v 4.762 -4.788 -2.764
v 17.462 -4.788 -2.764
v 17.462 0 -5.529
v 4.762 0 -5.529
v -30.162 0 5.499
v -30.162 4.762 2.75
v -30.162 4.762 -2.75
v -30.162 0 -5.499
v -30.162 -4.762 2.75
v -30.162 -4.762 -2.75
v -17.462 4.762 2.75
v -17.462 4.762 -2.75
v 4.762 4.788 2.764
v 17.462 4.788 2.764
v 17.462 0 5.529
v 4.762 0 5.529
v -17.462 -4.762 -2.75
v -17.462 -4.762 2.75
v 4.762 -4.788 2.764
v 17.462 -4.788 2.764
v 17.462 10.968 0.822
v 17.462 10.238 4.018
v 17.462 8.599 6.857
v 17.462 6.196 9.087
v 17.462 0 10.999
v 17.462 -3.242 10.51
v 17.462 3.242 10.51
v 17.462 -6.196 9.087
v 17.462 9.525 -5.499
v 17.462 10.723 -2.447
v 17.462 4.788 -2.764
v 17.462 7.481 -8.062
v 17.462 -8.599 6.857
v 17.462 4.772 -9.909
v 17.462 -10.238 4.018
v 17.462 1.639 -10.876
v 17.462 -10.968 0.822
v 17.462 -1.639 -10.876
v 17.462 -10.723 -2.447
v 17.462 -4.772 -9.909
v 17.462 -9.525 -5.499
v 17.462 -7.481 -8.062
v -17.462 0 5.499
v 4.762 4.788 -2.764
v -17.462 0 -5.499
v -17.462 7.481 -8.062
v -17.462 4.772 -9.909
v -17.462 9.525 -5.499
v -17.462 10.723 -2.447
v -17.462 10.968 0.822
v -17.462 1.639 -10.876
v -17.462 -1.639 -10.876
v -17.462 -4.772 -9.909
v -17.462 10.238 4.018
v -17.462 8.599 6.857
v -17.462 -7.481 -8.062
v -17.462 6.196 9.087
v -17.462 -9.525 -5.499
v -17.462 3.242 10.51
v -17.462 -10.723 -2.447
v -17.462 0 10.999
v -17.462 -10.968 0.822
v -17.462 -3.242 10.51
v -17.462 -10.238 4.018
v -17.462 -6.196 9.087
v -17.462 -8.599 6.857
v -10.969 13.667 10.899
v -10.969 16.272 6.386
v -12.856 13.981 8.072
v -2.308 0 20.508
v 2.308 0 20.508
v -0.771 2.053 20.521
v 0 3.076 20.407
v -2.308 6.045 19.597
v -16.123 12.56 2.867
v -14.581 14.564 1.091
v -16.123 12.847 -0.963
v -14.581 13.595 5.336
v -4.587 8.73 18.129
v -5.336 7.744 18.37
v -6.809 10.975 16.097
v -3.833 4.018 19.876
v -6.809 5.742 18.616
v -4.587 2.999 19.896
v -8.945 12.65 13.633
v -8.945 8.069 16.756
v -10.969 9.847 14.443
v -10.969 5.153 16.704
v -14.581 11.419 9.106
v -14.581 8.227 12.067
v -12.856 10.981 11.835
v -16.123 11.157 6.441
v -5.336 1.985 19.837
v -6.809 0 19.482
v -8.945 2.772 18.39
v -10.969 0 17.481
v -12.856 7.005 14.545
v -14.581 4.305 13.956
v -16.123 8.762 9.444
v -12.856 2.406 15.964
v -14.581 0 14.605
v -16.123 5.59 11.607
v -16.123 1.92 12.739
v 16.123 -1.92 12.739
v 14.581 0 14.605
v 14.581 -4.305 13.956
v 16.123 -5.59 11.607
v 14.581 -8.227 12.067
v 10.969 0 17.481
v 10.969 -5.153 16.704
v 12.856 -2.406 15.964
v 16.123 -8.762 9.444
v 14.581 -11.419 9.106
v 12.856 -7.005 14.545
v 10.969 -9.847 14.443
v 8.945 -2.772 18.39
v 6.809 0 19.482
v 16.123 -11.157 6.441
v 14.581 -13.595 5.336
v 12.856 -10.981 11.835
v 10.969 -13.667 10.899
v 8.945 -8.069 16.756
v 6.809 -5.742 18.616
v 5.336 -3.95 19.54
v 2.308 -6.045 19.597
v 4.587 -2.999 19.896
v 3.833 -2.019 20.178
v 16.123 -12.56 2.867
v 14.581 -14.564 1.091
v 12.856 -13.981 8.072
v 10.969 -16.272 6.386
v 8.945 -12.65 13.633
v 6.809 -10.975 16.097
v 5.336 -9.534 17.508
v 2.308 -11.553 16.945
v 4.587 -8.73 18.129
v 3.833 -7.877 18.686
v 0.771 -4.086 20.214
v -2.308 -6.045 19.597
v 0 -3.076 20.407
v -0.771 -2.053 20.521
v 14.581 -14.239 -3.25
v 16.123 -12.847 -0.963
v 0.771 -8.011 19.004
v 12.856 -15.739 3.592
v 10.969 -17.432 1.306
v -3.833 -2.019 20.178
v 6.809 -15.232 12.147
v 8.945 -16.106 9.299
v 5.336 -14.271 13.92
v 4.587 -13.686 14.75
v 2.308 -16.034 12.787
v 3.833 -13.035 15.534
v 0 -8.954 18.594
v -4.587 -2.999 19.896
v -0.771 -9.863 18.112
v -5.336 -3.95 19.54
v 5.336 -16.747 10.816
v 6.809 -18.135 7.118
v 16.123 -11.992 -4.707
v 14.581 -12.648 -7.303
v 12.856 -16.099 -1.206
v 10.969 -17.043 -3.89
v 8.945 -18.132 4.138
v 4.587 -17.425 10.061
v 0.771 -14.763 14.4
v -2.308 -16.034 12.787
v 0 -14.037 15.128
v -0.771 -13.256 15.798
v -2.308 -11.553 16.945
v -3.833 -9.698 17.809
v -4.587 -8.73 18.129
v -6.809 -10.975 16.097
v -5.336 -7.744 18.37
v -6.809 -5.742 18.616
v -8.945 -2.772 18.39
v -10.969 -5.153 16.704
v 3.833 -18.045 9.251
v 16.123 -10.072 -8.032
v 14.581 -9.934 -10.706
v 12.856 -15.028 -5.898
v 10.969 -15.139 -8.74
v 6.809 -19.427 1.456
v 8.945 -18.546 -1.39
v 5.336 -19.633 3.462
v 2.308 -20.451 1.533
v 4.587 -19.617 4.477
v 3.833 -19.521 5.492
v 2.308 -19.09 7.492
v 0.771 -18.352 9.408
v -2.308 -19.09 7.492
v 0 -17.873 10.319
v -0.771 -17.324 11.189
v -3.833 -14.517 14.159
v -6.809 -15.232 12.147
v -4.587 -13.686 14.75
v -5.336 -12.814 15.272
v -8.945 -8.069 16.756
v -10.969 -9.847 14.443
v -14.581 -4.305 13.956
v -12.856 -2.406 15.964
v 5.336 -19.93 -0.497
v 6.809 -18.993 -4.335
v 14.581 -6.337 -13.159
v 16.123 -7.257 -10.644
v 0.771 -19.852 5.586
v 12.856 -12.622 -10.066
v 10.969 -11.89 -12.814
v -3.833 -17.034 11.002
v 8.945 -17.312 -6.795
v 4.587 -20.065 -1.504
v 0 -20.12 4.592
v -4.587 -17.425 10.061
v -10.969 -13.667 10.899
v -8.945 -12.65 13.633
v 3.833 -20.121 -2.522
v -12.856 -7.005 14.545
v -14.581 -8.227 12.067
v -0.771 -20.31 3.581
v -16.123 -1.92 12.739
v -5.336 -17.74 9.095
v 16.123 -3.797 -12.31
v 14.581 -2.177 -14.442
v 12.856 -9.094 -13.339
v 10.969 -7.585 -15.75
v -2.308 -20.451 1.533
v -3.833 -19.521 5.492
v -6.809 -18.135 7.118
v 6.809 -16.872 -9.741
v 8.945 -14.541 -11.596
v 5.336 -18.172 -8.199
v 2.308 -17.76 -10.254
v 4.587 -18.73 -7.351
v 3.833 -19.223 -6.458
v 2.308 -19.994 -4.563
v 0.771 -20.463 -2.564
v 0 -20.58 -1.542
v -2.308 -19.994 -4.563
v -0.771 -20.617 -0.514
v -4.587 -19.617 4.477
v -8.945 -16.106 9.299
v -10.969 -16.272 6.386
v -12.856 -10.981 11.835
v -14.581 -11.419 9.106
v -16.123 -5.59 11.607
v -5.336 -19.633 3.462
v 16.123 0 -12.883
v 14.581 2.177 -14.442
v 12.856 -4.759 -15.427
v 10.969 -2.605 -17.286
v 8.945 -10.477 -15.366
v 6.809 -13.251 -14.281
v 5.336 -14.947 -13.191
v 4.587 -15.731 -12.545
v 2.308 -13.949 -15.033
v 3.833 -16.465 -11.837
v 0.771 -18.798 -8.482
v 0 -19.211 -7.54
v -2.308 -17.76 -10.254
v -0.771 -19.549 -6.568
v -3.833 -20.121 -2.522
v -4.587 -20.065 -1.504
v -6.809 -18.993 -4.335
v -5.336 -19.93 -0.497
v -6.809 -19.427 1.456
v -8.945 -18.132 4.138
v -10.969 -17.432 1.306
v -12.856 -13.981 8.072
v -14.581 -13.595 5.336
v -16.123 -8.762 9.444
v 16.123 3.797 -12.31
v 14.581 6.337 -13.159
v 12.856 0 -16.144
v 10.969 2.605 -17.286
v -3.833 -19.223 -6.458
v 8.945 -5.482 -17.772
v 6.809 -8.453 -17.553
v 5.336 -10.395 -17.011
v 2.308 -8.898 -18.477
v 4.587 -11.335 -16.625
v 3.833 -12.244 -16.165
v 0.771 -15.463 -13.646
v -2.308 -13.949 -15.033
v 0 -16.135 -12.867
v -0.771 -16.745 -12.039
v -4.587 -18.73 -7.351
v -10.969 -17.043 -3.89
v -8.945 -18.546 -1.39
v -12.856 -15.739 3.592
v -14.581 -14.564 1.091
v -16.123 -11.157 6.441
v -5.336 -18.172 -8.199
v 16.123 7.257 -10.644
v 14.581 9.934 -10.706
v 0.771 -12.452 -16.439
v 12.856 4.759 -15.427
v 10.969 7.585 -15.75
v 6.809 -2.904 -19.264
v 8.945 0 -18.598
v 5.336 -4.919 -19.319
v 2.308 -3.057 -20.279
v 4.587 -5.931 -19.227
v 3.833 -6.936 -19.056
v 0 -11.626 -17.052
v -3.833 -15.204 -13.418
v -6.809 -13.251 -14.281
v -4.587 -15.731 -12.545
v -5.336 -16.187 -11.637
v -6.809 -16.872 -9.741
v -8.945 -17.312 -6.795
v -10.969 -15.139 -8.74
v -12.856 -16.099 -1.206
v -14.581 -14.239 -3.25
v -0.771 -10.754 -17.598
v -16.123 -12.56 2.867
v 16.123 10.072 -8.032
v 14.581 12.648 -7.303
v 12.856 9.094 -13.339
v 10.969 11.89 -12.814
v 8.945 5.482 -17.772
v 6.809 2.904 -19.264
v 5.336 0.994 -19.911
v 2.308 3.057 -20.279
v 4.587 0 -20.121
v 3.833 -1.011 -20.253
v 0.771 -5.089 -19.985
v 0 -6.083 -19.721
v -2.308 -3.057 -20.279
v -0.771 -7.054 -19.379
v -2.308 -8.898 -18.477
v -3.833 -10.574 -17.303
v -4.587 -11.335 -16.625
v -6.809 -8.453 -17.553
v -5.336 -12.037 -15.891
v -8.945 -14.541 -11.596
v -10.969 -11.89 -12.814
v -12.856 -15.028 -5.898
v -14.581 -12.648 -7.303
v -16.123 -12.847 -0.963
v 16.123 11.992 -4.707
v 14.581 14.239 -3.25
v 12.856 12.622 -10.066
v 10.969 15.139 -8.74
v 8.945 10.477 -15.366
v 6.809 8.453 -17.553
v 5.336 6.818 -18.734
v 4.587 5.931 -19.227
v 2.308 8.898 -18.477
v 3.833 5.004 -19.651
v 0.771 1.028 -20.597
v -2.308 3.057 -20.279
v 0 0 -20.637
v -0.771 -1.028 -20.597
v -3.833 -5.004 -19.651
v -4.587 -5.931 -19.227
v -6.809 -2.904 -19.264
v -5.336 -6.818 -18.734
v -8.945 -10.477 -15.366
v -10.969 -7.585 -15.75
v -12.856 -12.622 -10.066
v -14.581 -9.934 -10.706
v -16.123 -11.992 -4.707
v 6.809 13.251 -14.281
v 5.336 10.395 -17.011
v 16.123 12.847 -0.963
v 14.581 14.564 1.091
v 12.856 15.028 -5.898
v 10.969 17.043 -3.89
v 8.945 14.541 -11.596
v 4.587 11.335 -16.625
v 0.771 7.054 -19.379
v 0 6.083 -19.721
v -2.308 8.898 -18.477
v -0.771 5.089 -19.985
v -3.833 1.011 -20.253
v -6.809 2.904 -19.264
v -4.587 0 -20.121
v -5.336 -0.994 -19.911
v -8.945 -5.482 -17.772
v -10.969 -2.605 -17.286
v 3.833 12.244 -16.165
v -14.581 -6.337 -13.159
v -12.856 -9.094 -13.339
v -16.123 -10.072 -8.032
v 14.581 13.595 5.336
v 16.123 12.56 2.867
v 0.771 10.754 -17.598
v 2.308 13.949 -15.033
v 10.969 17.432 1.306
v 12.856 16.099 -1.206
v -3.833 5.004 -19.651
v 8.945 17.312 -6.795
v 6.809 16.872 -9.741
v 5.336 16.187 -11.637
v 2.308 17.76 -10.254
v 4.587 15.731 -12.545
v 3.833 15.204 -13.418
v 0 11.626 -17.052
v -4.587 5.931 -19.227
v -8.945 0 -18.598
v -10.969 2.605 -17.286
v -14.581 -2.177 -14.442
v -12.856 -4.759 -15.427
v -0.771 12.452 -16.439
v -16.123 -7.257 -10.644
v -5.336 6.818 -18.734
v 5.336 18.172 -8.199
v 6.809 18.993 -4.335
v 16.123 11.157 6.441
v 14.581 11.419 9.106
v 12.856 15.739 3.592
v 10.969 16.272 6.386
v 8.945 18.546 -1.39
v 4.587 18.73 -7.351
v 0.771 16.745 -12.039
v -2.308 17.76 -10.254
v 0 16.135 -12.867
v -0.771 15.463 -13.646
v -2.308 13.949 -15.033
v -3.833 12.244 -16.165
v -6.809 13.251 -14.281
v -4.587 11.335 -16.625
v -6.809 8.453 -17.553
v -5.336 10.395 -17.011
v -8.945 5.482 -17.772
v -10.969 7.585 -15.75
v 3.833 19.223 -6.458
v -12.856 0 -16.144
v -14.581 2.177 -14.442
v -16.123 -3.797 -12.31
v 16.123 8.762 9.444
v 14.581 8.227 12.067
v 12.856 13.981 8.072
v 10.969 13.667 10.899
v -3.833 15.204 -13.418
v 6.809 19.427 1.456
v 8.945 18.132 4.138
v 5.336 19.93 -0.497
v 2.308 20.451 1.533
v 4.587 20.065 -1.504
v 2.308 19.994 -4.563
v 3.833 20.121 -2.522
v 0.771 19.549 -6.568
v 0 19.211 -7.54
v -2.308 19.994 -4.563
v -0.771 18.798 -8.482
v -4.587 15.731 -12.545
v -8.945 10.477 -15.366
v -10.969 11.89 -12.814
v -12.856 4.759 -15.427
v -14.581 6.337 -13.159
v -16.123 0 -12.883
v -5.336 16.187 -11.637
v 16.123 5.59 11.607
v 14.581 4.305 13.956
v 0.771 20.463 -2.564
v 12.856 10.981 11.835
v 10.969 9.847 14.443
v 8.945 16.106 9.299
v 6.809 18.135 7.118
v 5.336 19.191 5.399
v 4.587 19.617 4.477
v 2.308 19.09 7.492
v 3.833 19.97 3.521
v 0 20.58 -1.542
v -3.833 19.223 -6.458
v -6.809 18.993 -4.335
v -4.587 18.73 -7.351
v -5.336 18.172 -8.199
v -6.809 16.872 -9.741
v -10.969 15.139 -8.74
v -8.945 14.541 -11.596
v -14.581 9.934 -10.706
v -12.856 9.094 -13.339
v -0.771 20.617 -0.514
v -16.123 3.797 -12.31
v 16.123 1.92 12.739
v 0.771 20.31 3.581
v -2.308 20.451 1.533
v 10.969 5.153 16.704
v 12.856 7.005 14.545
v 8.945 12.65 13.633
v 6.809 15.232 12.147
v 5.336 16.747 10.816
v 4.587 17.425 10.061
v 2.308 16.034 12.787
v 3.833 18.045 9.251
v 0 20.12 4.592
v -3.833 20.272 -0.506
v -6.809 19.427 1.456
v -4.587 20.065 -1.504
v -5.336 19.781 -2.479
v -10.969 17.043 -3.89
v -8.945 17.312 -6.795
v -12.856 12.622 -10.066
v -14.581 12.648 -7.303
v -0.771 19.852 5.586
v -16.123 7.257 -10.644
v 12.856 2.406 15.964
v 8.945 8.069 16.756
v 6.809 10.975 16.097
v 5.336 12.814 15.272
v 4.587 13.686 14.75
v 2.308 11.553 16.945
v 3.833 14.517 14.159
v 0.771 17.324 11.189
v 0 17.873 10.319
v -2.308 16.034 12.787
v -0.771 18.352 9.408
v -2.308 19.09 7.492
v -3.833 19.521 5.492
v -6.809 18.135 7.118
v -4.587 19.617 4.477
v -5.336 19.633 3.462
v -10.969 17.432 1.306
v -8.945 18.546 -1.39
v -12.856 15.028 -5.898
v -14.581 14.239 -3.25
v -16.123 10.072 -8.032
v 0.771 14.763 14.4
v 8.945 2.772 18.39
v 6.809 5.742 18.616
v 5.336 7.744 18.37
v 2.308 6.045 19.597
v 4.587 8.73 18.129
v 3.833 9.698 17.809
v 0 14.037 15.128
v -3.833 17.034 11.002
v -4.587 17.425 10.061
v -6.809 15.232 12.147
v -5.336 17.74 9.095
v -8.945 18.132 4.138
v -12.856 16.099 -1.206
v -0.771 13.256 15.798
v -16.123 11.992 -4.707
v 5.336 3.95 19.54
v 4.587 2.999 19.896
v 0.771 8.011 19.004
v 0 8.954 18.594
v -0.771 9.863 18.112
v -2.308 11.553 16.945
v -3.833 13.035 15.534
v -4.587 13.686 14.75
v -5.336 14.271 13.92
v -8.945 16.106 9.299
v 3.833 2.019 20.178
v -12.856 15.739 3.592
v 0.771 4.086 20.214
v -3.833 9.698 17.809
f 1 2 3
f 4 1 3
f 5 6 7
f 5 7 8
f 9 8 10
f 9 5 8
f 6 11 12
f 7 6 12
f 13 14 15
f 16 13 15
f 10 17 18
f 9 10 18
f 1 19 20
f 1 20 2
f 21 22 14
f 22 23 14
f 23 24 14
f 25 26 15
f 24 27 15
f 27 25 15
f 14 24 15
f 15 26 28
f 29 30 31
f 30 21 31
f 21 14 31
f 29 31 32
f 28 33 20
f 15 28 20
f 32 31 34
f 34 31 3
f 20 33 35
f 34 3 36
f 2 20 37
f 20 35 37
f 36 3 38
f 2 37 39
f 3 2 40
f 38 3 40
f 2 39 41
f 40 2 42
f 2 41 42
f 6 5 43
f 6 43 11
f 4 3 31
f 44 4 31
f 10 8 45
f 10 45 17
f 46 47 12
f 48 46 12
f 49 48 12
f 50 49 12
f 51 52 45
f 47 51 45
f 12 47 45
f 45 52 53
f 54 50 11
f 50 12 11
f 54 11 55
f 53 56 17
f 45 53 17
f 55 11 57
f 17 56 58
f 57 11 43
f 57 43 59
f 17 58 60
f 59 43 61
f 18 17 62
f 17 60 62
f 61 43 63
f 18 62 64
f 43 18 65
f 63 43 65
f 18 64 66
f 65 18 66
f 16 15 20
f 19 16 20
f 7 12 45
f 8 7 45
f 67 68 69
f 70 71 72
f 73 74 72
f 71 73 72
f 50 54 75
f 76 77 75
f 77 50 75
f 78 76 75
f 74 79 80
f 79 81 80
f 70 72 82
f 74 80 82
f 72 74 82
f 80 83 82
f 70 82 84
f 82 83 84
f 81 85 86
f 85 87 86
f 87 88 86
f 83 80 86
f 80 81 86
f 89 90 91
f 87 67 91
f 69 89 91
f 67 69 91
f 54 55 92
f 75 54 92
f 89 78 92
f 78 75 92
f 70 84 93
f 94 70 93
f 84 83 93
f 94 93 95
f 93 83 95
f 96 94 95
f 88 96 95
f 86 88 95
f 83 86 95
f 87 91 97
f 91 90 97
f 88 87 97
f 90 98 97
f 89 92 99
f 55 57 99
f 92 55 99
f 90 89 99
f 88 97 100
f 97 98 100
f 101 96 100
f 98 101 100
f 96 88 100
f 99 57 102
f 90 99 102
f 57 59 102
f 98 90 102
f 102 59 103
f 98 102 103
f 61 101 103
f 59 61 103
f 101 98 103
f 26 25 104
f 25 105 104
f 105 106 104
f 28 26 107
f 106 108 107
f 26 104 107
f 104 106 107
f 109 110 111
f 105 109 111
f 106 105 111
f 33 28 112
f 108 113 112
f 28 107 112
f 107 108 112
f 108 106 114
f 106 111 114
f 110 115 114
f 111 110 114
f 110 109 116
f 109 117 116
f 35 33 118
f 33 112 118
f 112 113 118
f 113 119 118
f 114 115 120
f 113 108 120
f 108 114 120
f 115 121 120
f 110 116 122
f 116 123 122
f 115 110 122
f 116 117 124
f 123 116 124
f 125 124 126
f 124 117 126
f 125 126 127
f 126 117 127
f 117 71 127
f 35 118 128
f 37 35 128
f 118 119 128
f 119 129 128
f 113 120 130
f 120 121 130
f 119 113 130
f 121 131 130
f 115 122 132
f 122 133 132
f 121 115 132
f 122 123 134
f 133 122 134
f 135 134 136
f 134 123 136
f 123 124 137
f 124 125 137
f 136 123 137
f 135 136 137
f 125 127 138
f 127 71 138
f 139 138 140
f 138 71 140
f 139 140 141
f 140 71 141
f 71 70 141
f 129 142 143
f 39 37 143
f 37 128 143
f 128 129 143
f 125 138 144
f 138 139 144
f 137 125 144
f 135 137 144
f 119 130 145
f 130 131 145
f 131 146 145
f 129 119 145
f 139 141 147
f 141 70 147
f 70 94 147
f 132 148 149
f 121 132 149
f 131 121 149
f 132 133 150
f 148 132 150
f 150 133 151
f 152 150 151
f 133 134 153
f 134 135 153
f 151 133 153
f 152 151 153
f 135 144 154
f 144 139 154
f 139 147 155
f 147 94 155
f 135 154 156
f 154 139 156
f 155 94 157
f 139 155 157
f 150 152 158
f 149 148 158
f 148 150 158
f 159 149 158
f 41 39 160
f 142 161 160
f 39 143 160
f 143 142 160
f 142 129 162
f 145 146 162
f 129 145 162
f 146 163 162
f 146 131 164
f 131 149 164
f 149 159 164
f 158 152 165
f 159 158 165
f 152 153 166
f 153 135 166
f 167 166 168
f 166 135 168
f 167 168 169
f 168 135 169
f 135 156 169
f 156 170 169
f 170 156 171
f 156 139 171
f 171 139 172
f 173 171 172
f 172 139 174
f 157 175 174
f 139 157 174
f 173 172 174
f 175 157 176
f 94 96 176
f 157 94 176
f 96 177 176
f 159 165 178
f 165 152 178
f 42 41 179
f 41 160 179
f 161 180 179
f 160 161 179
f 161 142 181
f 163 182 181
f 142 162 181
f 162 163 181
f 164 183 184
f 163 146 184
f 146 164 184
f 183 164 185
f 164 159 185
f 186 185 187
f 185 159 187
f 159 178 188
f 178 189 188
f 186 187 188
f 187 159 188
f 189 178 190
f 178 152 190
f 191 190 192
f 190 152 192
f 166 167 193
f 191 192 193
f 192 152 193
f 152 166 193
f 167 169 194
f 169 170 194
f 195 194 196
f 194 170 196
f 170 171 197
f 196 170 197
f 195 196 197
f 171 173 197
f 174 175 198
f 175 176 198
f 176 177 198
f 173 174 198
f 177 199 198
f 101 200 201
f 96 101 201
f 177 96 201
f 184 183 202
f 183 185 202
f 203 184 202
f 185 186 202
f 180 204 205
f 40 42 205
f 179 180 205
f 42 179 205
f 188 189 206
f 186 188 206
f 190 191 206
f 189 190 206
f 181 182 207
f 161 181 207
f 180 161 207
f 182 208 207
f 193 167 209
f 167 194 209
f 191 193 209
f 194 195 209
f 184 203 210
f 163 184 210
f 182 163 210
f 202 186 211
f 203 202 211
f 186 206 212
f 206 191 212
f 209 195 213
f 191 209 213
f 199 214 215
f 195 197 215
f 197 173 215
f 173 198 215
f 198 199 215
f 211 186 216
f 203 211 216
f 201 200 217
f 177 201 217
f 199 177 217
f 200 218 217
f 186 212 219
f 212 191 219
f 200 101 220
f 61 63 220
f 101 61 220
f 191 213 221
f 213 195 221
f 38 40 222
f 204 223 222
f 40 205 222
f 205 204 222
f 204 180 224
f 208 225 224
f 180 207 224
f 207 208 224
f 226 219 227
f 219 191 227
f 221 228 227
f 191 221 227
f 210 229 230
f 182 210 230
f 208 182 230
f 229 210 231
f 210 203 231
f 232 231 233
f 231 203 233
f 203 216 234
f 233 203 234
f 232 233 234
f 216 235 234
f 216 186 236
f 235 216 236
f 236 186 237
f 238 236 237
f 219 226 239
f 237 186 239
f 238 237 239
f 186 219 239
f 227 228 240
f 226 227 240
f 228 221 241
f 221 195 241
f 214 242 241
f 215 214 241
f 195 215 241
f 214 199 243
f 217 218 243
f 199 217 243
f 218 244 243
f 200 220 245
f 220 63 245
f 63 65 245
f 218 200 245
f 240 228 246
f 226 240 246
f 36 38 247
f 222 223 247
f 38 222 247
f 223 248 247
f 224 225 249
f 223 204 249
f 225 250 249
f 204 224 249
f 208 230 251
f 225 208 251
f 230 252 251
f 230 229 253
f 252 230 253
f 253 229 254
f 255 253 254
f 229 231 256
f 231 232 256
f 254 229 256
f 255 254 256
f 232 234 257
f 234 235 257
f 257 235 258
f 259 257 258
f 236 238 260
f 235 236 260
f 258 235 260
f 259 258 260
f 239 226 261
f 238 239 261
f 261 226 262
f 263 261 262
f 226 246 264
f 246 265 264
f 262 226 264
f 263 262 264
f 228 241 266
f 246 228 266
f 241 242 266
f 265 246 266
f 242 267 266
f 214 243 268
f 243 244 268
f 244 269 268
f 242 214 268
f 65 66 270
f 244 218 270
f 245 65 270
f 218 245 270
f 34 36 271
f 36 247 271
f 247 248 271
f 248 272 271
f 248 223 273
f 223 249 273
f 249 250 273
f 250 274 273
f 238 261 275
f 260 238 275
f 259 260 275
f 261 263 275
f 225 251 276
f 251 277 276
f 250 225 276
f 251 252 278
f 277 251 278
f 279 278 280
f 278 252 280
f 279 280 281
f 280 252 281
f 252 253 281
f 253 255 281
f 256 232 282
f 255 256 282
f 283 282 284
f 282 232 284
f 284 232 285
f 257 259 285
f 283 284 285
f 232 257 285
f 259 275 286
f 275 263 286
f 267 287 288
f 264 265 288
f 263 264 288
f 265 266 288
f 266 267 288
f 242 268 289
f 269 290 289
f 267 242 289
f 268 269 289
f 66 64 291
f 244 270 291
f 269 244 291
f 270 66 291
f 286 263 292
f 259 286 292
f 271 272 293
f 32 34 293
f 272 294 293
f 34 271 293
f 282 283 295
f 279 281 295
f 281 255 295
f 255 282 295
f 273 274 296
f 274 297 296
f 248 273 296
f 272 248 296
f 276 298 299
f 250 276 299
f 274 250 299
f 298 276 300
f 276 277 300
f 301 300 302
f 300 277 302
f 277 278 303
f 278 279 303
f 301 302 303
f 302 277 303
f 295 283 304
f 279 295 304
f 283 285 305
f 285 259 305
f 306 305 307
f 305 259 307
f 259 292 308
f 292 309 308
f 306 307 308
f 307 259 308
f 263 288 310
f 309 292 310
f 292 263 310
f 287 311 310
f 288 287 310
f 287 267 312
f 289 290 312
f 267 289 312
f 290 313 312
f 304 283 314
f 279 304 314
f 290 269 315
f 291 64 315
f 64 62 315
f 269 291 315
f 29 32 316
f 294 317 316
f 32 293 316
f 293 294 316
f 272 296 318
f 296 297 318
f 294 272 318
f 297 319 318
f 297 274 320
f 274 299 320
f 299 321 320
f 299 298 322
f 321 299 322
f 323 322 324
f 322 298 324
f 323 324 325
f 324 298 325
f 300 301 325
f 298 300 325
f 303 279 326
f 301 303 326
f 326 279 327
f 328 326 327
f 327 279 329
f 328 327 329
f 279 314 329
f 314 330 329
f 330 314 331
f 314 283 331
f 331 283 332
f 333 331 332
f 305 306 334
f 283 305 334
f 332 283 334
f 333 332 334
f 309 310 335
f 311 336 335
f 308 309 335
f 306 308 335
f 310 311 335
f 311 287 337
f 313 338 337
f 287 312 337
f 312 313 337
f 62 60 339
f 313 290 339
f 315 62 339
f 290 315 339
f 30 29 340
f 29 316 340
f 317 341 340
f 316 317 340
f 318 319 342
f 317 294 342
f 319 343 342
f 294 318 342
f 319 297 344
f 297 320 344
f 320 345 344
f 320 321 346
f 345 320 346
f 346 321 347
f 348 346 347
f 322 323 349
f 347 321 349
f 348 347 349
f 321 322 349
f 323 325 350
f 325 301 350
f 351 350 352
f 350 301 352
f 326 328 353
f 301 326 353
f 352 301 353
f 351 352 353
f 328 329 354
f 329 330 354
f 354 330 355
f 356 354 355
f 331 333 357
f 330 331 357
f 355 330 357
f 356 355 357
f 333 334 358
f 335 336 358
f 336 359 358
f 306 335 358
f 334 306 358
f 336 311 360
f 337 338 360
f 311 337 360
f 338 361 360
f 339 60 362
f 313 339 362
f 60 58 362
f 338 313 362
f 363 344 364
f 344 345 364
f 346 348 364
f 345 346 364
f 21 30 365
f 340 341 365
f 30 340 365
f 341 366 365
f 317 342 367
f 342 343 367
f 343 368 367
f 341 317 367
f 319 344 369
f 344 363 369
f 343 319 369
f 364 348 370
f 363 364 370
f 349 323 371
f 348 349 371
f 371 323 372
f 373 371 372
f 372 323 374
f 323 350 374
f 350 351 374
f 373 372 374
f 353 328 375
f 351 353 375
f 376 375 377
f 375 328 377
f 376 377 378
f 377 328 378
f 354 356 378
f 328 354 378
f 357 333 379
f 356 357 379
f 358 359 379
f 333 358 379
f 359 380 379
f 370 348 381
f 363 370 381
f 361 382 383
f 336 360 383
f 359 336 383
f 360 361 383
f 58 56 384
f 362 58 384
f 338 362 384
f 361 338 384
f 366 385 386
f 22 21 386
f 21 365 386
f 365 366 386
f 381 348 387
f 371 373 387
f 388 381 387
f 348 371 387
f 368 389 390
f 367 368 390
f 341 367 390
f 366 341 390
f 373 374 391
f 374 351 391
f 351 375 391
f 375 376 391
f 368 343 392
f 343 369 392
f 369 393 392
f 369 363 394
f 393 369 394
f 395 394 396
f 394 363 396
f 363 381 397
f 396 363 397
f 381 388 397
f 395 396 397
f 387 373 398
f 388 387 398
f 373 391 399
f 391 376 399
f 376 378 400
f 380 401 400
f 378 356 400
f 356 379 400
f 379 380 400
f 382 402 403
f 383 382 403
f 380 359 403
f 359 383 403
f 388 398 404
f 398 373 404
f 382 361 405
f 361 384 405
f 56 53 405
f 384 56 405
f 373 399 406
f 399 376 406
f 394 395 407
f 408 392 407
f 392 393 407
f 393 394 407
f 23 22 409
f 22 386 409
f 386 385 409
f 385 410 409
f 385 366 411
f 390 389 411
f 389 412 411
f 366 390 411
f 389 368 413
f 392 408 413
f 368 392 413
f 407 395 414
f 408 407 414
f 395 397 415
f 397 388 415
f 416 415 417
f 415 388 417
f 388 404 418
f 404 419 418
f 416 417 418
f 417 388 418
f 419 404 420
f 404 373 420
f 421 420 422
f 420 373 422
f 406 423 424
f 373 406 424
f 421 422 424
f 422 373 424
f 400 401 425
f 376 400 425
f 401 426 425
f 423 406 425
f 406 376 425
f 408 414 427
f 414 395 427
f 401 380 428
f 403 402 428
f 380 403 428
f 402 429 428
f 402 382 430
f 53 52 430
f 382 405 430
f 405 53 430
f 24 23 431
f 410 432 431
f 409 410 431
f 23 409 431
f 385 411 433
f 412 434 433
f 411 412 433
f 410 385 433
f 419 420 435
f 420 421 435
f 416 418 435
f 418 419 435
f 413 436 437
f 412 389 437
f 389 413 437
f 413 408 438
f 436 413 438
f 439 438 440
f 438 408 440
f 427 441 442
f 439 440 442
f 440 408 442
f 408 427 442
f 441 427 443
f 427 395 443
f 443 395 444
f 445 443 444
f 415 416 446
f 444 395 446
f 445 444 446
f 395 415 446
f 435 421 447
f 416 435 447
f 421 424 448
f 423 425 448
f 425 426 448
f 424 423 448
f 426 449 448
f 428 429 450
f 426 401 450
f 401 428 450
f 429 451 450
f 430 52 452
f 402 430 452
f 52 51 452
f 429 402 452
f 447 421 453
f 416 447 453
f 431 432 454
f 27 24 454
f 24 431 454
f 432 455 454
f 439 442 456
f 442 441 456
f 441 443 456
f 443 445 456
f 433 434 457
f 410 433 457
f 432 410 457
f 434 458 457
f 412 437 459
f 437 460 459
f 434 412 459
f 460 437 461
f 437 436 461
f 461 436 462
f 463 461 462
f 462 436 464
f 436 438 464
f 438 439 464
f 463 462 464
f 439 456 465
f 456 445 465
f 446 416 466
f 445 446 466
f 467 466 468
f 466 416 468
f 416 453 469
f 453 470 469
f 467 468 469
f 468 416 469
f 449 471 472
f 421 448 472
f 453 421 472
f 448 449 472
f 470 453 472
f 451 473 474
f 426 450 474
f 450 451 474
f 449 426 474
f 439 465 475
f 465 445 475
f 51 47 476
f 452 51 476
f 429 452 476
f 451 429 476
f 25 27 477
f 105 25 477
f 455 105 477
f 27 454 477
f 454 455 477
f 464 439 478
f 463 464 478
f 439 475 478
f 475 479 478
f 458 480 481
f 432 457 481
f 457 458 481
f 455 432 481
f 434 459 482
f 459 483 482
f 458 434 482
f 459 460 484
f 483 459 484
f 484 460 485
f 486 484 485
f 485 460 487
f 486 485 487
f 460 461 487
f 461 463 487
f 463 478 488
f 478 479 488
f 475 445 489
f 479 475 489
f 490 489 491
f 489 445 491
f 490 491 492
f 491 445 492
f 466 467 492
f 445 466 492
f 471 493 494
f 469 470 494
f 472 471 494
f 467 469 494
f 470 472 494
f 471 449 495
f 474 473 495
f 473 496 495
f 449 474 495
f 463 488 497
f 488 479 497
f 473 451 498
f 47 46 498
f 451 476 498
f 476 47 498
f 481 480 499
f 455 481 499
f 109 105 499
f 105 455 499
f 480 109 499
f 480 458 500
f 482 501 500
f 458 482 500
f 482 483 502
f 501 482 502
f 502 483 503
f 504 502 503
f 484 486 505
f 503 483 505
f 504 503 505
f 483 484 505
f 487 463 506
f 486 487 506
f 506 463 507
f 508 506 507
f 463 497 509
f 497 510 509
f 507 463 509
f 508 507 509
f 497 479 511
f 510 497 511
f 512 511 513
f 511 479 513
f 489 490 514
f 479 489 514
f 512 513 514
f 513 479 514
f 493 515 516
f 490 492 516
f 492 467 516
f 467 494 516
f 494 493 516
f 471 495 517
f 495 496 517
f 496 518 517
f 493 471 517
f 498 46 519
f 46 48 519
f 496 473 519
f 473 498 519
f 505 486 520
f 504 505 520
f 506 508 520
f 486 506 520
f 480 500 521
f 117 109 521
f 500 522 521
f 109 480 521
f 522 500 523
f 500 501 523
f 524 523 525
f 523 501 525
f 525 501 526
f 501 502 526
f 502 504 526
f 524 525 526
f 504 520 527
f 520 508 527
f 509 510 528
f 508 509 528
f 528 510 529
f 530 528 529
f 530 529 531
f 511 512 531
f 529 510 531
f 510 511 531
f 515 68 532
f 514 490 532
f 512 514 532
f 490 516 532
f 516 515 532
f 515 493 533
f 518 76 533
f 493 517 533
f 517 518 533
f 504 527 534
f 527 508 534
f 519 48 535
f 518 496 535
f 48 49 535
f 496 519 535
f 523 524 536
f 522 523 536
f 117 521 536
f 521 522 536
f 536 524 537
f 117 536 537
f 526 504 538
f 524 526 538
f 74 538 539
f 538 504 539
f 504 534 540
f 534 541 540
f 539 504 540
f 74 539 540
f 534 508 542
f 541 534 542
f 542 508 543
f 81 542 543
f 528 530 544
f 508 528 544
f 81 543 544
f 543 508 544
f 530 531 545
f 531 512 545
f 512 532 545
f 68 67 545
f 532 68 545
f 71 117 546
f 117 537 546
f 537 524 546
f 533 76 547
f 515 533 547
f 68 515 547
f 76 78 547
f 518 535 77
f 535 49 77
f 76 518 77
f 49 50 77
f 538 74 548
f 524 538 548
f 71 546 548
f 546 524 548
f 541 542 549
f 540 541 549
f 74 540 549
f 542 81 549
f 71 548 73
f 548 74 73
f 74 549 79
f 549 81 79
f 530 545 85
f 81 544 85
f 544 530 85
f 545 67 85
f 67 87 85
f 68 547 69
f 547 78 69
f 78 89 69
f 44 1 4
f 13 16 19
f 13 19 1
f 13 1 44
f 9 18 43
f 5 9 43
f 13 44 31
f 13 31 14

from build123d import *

# Parameters (mm, degrees)
F3_DEPTH = 12.7
F5_DEPTH = 12.7


with BuildPart() as f1:
    # F0 (on Front) → F1 (revolve)
    with BuildSketch(Plane.XZ):
        with BuildLine():
            Line((17.4625, 0), (17.4625, 10.998523))
            ThreePointArc((17.4625, 10.998523), (0, 20.6375), (-17.4625, 10.998523))
            Line((-17.4625, 10.998523), (-17.4625, 0))
            Line((-17.4625, 0), (17.4625, 0))
        make_face()
    revolve(axis=Axis((-1.484415, 0, 0), (1, 0, 0)))

    # F2 (on face) → F3 (cut)
    with BuildSketch(Plane.YZ.offset(17.4625)):
        Polygon((4.7879, -2.764295), (4.7879, 2.764295), (0, 5.528591), (-4.7879, 2.764295), (-4.7879, -2.764295), (0, -5.528591), align=None)
    extrude(amount=-F3_DEPTH, mode=Mode.SUBTRACT)

    # F4 (on face) → F5 (join)
    with BuildSketch(Plane(origin=(-17.4625, 0, 0), x_dir=(0, -1, 0), z_dir=(-1, 0, 0))):
        Polygon((4.7625, -2.749631), (4.7625, 2.749631), (0, 5.499261), (-4.7625, 2.749631), (-4.7625, -2.749631), (0, -5.499261), align=None)
    extrude(amount=F5_DEPTH)


solid = f1.part
